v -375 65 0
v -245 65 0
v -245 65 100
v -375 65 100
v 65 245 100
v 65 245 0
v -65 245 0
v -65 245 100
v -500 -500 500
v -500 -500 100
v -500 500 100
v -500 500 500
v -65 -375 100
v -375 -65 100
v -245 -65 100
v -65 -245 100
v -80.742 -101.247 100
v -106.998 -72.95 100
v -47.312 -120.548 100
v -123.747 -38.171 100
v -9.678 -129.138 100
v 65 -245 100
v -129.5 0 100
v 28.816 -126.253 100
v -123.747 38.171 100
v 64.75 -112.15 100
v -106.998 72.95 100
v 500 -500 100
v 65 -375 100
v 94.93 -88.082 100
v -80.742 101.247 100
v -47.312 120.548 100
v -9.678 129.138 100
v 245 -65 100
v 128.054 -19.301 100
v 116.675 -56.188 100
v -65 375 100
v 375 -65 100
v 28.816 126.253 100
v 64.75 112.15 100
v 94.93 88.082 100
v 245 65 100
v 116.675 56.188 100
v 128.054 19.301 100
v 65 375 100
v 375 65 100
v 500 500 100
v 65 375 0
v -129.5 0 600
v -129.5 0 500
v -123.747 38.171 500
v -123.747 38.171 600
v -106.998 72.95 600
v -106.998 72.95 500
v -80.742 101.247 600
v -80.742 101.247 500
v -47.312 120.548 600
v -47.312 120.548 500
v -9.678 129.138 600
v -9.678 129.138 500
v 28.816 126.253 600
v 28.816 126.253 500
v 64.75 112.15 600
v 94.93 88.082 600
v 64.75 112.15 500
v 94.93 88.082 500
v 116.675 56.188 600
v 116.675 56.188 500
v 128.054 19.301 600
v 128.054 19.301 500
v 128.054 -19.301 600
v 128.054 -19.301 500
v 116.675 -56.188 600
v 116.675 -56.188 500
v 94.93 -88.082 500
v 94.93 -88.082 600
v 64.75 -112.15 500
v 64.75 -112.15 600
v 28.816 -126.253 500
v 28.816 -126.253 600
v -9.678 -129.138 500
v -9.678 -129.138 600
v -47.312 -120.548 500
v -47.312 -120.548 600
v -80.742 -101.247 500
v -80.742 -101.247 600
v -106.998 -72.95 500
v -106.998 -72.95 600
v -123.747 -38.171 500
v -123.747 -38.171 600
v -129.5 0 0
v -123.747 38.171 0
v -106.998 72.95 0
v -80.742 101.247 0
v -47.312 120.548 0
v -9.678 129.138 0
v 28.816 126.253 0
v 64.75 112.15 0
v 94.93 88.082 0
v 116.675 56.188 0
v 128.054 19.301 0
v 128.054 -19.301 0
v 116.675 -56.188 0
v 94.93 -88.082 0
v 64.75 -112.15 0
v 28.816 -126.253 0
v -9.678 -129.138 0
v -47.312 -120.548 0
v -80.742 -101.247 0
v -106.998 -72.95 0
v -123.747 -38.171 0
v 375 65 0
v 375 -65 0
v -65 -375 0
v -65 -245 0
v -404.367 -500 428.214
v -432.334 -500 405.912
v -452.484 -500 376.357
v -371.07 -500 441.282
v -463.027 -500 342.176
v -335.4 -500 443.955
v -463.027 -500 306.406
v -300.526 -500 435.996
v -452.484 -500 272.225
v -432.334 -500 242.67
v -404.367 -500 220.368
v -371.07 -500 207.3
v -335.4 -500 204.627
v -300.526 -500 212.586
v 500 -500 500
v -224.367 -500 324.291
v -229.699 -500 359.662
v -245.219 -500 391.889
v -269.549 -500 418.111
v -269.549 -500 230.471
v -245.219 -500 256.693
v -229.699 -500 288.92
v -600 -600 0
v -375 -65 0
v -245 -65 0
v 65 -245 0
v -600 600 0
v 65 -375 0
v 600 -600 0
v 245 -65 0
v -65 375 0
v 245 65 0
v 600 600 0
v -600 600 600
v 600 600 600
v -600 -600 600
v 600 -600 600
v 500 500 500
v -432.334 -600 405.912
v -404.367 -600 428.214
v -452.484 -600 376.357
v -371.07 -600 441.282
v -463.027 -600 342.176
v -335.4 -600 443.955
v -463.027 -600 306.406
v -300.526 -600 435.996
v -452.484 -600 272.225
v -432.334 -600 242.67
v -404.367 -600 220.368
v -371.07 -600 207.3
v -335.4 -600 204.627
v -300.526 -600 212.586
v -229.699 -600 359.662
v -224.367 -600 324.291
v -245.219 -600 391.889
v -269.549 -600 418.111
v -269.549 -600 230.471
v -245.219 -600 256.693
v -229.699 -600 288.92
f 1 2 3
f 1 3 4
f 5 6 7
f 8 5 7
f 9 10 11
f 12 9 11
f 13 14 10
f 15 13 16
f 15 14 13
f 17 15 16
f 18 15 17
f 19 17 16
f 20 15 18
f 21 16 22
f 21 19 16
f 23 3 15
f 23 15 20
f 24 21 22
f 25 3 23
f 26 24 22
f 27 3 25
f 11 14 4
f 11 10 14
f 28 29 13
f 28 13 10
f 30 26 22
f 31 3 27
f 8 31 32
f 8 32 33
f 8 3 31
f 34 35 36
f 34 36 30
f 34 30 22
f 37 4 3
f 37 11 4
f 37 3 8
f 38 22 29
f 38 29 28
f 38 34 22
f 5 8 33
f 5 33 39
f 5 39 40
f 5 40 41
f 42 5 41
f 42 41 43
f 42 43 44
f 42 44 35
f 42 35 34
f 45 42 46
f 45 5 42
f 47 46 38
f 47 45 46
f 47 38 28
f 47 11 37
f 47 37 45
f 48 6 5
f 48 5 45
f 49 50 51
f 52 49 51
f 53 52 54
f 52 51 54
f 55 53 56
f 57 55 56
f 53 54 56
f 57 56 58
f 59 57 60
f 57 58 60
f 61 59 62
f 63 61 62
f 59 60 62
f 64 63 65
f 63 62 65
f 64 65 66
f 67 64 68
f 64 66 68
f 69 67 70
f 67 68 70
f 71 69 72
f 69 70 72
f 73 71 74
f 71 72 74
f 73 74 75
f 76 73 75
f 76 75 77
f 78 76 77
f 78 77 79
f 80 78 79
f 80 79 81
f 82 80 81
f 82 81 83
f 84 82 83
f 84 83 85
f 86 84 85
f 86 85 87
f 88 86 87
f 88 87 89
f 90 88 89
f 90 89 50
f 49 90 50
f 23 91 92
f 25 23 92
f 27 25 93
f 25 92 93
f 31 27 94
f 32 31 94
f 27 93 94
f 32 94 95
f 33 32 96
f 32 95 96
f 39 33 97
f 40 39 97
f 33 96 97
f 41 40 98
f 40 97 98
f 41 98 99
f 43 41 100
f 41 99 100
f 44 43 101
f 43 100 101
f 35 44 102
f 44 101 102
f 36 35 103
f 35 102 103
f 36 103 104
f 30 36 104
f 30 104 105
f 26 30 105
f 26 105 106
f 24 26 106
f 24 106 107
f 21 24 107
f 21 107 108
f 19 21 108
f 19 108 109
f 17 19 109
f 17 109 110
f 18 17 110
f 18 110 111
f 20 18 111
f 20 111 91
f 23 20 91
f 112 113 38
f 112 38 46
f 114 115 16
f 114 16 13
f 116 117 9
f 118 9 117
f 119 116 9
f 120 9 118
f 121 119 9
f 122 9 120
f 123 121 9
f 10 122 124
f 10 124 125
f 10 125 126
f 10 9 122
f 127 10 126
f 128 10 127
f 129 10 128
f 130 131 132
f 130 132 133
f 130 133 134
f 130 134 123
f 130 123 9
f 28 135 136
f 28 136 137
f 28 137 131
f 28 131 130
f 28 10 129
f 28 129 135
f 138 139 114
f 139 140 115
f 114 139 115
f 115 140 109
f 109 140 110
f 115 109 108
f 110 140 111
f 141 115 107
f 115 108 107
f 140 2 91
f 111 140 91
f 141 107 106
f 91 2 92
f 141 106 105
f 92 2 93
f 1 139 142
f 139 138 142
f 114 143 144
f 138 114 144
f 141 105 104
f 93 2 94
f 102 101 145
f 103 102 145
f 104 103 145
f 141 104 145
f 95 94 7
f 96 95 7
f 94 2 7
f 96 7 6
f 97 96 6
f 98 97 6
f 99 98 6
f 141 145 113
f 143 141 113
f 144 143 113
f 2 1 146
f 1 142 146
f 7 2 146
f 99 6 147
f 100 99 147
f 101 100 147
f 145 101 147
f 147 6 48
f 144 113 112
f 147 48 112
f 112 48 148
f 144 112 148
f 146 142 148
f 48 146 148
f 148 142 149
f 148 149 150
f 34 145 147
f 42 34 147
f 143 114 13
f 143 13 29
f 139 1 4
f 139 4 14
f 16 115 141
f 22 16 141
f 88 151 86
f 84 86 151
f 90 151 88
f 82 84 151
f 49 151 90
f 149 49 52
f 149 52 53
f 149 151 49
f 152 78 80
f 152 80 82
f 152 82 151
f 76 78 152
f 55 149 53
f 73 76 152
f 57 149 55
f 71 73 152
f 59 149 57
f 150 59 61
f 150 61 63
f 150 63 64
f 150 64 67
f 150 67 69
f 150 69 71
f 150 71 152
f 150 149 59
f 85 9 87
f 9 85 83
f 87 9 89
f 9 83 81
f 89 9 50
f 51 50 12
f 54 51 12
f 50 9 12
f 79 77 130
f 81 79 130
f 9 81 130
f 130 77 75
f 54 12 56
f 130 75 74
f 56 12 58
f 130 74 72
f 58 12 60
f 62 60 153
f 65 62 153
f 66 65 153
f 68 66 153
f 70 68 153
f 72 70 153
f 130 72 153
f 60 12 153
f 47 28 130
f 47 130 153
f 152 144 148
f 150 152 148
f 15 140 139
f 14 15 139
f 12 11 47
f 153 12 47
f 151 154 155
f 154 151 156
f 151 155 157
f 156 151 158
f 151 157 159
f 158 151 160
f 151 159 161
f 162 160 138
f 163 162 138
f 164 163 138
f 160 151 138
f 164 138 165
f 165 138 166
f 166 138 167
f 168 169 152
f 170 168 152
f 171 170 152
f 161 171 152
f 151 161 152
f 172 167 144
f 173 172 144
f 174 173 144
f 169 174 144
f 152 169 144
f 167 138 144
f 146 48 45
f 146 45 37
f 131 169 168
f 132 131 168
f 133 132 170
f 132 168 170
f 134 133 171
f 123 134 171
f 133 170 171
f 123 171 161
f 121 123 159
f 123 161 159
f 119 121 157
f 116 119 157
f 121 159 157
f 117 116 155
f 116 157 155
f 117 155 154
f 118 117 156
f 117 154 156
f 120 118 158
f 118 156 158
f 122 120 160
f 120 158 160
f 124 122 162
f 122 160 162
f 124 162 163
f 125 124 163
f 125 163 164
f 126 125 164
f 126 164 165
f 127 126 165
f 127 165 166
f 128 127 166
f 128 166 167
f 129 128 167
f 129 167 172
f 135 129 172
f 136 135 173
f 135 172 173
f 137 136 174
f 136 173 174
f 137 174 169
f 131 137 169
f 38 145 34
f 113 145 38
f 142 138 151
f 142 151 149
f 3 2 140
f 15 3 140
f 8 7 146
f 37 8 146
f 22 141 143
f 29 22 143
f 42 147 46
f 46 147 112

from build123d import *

# Parameters (mm, degrees)
SKETCH2_W           = 1200
SKETCH2_H           = 1200
BOSS_EXTRUDE1_DEPTH = 600
SHELL1_T            = -100
SKETCH4_W           = 1200
SKETCH4_H           = 1200
BOSS_EXTRUDE2_DEPTH = 100
SKETCH5_R           = 129.5
CUT_EXTRUDE2_DEPTH  = 601
SKETCH7_W           = 130
SKETCH7_H           = 130
CUT_EXTRUDE3_DEPTH  = 146
CIRPATTERN1_COUNT   = 4
SKETCH8_R           = 120
CUT_EXTRUDE4_DEPTH  = 100


with BuildPart() as part:
    # Sketch2 → Boss-Extrude1 (new body)
    with BuildSketch(Plane.XY):
        Rectangle(SKETCH2_W, SKETCH2_H)
    extrude(amount=BOSS_EXTRUDE1_DEPTH)

    # Shell1
    shell1_openings = [part.faces().sort_by_distance(p)[0] for p in [
        (0, 0, 600),
    ]]
    offset(amount=SHELL1_T, openings=shell1_openings, kind=Kind.INTERSECTION)

    # Sketch4 → Boss-Extrude2 (add)
    with BuildSketch(Plane.XY.offset(600)):
        Rectangle(SKETCH4_W, SKETCH4_H)
    extrude(amount=-BOSS_EXTRUDE2_DEPTH)

    # Sketch5 → Cut-Extrude2 (cut, through all)
    with BuildSketch(Plane(origin=(0, 0, 0), x_dir=(-1, 0, 0), z_dir=(0, 0, -1))):
        Circle(SKETCH5_R)
    extrude(amount=-CUT_EXTRUDE2_DEPTH, mode=Mode.SUBTRACT)

    # Sketch7 → Cut-Extrude3 (cut)
    with BuildSketch(Plane(origin=(0, 0, 0), x_dir=(-1, 0, 0), z_dir=(0, 0, -1))):
        with Locations((0, 310)):
            Rectangle(SKETCH7_W, SKETCH7_H)
    cut_extrude3 = extrude(amount=-CUT_EXTRUDE3_DEPTH, mode=Mode.SUBTRACT)

    # CirPattern1: Cut-Extrude3 ×4 about axis
    cirpattern1_axis = Axis((0, 0, 0), (0, 0, 1))
    for i in range(1, CIRPATTERN1_COUNT):
        add(cut_extrude3.rotate(cirpattern1_axis, i * 360 / CIRPATTERN1_COUNT), mode=Mode.SUBTRACT)

    # Sketch8 → Cut-Extrude4 (cut)
    with BuildSketch(Plane.XZ.offset(600)):
        with Locations((-344.367385343, 324.291039311)):
            Circle(SKETCH8_R)
    extrude(amount=-CUT_EXTRUDE4_DEPTH, mode=Mode.SUBTRACT)


solid = part.part
